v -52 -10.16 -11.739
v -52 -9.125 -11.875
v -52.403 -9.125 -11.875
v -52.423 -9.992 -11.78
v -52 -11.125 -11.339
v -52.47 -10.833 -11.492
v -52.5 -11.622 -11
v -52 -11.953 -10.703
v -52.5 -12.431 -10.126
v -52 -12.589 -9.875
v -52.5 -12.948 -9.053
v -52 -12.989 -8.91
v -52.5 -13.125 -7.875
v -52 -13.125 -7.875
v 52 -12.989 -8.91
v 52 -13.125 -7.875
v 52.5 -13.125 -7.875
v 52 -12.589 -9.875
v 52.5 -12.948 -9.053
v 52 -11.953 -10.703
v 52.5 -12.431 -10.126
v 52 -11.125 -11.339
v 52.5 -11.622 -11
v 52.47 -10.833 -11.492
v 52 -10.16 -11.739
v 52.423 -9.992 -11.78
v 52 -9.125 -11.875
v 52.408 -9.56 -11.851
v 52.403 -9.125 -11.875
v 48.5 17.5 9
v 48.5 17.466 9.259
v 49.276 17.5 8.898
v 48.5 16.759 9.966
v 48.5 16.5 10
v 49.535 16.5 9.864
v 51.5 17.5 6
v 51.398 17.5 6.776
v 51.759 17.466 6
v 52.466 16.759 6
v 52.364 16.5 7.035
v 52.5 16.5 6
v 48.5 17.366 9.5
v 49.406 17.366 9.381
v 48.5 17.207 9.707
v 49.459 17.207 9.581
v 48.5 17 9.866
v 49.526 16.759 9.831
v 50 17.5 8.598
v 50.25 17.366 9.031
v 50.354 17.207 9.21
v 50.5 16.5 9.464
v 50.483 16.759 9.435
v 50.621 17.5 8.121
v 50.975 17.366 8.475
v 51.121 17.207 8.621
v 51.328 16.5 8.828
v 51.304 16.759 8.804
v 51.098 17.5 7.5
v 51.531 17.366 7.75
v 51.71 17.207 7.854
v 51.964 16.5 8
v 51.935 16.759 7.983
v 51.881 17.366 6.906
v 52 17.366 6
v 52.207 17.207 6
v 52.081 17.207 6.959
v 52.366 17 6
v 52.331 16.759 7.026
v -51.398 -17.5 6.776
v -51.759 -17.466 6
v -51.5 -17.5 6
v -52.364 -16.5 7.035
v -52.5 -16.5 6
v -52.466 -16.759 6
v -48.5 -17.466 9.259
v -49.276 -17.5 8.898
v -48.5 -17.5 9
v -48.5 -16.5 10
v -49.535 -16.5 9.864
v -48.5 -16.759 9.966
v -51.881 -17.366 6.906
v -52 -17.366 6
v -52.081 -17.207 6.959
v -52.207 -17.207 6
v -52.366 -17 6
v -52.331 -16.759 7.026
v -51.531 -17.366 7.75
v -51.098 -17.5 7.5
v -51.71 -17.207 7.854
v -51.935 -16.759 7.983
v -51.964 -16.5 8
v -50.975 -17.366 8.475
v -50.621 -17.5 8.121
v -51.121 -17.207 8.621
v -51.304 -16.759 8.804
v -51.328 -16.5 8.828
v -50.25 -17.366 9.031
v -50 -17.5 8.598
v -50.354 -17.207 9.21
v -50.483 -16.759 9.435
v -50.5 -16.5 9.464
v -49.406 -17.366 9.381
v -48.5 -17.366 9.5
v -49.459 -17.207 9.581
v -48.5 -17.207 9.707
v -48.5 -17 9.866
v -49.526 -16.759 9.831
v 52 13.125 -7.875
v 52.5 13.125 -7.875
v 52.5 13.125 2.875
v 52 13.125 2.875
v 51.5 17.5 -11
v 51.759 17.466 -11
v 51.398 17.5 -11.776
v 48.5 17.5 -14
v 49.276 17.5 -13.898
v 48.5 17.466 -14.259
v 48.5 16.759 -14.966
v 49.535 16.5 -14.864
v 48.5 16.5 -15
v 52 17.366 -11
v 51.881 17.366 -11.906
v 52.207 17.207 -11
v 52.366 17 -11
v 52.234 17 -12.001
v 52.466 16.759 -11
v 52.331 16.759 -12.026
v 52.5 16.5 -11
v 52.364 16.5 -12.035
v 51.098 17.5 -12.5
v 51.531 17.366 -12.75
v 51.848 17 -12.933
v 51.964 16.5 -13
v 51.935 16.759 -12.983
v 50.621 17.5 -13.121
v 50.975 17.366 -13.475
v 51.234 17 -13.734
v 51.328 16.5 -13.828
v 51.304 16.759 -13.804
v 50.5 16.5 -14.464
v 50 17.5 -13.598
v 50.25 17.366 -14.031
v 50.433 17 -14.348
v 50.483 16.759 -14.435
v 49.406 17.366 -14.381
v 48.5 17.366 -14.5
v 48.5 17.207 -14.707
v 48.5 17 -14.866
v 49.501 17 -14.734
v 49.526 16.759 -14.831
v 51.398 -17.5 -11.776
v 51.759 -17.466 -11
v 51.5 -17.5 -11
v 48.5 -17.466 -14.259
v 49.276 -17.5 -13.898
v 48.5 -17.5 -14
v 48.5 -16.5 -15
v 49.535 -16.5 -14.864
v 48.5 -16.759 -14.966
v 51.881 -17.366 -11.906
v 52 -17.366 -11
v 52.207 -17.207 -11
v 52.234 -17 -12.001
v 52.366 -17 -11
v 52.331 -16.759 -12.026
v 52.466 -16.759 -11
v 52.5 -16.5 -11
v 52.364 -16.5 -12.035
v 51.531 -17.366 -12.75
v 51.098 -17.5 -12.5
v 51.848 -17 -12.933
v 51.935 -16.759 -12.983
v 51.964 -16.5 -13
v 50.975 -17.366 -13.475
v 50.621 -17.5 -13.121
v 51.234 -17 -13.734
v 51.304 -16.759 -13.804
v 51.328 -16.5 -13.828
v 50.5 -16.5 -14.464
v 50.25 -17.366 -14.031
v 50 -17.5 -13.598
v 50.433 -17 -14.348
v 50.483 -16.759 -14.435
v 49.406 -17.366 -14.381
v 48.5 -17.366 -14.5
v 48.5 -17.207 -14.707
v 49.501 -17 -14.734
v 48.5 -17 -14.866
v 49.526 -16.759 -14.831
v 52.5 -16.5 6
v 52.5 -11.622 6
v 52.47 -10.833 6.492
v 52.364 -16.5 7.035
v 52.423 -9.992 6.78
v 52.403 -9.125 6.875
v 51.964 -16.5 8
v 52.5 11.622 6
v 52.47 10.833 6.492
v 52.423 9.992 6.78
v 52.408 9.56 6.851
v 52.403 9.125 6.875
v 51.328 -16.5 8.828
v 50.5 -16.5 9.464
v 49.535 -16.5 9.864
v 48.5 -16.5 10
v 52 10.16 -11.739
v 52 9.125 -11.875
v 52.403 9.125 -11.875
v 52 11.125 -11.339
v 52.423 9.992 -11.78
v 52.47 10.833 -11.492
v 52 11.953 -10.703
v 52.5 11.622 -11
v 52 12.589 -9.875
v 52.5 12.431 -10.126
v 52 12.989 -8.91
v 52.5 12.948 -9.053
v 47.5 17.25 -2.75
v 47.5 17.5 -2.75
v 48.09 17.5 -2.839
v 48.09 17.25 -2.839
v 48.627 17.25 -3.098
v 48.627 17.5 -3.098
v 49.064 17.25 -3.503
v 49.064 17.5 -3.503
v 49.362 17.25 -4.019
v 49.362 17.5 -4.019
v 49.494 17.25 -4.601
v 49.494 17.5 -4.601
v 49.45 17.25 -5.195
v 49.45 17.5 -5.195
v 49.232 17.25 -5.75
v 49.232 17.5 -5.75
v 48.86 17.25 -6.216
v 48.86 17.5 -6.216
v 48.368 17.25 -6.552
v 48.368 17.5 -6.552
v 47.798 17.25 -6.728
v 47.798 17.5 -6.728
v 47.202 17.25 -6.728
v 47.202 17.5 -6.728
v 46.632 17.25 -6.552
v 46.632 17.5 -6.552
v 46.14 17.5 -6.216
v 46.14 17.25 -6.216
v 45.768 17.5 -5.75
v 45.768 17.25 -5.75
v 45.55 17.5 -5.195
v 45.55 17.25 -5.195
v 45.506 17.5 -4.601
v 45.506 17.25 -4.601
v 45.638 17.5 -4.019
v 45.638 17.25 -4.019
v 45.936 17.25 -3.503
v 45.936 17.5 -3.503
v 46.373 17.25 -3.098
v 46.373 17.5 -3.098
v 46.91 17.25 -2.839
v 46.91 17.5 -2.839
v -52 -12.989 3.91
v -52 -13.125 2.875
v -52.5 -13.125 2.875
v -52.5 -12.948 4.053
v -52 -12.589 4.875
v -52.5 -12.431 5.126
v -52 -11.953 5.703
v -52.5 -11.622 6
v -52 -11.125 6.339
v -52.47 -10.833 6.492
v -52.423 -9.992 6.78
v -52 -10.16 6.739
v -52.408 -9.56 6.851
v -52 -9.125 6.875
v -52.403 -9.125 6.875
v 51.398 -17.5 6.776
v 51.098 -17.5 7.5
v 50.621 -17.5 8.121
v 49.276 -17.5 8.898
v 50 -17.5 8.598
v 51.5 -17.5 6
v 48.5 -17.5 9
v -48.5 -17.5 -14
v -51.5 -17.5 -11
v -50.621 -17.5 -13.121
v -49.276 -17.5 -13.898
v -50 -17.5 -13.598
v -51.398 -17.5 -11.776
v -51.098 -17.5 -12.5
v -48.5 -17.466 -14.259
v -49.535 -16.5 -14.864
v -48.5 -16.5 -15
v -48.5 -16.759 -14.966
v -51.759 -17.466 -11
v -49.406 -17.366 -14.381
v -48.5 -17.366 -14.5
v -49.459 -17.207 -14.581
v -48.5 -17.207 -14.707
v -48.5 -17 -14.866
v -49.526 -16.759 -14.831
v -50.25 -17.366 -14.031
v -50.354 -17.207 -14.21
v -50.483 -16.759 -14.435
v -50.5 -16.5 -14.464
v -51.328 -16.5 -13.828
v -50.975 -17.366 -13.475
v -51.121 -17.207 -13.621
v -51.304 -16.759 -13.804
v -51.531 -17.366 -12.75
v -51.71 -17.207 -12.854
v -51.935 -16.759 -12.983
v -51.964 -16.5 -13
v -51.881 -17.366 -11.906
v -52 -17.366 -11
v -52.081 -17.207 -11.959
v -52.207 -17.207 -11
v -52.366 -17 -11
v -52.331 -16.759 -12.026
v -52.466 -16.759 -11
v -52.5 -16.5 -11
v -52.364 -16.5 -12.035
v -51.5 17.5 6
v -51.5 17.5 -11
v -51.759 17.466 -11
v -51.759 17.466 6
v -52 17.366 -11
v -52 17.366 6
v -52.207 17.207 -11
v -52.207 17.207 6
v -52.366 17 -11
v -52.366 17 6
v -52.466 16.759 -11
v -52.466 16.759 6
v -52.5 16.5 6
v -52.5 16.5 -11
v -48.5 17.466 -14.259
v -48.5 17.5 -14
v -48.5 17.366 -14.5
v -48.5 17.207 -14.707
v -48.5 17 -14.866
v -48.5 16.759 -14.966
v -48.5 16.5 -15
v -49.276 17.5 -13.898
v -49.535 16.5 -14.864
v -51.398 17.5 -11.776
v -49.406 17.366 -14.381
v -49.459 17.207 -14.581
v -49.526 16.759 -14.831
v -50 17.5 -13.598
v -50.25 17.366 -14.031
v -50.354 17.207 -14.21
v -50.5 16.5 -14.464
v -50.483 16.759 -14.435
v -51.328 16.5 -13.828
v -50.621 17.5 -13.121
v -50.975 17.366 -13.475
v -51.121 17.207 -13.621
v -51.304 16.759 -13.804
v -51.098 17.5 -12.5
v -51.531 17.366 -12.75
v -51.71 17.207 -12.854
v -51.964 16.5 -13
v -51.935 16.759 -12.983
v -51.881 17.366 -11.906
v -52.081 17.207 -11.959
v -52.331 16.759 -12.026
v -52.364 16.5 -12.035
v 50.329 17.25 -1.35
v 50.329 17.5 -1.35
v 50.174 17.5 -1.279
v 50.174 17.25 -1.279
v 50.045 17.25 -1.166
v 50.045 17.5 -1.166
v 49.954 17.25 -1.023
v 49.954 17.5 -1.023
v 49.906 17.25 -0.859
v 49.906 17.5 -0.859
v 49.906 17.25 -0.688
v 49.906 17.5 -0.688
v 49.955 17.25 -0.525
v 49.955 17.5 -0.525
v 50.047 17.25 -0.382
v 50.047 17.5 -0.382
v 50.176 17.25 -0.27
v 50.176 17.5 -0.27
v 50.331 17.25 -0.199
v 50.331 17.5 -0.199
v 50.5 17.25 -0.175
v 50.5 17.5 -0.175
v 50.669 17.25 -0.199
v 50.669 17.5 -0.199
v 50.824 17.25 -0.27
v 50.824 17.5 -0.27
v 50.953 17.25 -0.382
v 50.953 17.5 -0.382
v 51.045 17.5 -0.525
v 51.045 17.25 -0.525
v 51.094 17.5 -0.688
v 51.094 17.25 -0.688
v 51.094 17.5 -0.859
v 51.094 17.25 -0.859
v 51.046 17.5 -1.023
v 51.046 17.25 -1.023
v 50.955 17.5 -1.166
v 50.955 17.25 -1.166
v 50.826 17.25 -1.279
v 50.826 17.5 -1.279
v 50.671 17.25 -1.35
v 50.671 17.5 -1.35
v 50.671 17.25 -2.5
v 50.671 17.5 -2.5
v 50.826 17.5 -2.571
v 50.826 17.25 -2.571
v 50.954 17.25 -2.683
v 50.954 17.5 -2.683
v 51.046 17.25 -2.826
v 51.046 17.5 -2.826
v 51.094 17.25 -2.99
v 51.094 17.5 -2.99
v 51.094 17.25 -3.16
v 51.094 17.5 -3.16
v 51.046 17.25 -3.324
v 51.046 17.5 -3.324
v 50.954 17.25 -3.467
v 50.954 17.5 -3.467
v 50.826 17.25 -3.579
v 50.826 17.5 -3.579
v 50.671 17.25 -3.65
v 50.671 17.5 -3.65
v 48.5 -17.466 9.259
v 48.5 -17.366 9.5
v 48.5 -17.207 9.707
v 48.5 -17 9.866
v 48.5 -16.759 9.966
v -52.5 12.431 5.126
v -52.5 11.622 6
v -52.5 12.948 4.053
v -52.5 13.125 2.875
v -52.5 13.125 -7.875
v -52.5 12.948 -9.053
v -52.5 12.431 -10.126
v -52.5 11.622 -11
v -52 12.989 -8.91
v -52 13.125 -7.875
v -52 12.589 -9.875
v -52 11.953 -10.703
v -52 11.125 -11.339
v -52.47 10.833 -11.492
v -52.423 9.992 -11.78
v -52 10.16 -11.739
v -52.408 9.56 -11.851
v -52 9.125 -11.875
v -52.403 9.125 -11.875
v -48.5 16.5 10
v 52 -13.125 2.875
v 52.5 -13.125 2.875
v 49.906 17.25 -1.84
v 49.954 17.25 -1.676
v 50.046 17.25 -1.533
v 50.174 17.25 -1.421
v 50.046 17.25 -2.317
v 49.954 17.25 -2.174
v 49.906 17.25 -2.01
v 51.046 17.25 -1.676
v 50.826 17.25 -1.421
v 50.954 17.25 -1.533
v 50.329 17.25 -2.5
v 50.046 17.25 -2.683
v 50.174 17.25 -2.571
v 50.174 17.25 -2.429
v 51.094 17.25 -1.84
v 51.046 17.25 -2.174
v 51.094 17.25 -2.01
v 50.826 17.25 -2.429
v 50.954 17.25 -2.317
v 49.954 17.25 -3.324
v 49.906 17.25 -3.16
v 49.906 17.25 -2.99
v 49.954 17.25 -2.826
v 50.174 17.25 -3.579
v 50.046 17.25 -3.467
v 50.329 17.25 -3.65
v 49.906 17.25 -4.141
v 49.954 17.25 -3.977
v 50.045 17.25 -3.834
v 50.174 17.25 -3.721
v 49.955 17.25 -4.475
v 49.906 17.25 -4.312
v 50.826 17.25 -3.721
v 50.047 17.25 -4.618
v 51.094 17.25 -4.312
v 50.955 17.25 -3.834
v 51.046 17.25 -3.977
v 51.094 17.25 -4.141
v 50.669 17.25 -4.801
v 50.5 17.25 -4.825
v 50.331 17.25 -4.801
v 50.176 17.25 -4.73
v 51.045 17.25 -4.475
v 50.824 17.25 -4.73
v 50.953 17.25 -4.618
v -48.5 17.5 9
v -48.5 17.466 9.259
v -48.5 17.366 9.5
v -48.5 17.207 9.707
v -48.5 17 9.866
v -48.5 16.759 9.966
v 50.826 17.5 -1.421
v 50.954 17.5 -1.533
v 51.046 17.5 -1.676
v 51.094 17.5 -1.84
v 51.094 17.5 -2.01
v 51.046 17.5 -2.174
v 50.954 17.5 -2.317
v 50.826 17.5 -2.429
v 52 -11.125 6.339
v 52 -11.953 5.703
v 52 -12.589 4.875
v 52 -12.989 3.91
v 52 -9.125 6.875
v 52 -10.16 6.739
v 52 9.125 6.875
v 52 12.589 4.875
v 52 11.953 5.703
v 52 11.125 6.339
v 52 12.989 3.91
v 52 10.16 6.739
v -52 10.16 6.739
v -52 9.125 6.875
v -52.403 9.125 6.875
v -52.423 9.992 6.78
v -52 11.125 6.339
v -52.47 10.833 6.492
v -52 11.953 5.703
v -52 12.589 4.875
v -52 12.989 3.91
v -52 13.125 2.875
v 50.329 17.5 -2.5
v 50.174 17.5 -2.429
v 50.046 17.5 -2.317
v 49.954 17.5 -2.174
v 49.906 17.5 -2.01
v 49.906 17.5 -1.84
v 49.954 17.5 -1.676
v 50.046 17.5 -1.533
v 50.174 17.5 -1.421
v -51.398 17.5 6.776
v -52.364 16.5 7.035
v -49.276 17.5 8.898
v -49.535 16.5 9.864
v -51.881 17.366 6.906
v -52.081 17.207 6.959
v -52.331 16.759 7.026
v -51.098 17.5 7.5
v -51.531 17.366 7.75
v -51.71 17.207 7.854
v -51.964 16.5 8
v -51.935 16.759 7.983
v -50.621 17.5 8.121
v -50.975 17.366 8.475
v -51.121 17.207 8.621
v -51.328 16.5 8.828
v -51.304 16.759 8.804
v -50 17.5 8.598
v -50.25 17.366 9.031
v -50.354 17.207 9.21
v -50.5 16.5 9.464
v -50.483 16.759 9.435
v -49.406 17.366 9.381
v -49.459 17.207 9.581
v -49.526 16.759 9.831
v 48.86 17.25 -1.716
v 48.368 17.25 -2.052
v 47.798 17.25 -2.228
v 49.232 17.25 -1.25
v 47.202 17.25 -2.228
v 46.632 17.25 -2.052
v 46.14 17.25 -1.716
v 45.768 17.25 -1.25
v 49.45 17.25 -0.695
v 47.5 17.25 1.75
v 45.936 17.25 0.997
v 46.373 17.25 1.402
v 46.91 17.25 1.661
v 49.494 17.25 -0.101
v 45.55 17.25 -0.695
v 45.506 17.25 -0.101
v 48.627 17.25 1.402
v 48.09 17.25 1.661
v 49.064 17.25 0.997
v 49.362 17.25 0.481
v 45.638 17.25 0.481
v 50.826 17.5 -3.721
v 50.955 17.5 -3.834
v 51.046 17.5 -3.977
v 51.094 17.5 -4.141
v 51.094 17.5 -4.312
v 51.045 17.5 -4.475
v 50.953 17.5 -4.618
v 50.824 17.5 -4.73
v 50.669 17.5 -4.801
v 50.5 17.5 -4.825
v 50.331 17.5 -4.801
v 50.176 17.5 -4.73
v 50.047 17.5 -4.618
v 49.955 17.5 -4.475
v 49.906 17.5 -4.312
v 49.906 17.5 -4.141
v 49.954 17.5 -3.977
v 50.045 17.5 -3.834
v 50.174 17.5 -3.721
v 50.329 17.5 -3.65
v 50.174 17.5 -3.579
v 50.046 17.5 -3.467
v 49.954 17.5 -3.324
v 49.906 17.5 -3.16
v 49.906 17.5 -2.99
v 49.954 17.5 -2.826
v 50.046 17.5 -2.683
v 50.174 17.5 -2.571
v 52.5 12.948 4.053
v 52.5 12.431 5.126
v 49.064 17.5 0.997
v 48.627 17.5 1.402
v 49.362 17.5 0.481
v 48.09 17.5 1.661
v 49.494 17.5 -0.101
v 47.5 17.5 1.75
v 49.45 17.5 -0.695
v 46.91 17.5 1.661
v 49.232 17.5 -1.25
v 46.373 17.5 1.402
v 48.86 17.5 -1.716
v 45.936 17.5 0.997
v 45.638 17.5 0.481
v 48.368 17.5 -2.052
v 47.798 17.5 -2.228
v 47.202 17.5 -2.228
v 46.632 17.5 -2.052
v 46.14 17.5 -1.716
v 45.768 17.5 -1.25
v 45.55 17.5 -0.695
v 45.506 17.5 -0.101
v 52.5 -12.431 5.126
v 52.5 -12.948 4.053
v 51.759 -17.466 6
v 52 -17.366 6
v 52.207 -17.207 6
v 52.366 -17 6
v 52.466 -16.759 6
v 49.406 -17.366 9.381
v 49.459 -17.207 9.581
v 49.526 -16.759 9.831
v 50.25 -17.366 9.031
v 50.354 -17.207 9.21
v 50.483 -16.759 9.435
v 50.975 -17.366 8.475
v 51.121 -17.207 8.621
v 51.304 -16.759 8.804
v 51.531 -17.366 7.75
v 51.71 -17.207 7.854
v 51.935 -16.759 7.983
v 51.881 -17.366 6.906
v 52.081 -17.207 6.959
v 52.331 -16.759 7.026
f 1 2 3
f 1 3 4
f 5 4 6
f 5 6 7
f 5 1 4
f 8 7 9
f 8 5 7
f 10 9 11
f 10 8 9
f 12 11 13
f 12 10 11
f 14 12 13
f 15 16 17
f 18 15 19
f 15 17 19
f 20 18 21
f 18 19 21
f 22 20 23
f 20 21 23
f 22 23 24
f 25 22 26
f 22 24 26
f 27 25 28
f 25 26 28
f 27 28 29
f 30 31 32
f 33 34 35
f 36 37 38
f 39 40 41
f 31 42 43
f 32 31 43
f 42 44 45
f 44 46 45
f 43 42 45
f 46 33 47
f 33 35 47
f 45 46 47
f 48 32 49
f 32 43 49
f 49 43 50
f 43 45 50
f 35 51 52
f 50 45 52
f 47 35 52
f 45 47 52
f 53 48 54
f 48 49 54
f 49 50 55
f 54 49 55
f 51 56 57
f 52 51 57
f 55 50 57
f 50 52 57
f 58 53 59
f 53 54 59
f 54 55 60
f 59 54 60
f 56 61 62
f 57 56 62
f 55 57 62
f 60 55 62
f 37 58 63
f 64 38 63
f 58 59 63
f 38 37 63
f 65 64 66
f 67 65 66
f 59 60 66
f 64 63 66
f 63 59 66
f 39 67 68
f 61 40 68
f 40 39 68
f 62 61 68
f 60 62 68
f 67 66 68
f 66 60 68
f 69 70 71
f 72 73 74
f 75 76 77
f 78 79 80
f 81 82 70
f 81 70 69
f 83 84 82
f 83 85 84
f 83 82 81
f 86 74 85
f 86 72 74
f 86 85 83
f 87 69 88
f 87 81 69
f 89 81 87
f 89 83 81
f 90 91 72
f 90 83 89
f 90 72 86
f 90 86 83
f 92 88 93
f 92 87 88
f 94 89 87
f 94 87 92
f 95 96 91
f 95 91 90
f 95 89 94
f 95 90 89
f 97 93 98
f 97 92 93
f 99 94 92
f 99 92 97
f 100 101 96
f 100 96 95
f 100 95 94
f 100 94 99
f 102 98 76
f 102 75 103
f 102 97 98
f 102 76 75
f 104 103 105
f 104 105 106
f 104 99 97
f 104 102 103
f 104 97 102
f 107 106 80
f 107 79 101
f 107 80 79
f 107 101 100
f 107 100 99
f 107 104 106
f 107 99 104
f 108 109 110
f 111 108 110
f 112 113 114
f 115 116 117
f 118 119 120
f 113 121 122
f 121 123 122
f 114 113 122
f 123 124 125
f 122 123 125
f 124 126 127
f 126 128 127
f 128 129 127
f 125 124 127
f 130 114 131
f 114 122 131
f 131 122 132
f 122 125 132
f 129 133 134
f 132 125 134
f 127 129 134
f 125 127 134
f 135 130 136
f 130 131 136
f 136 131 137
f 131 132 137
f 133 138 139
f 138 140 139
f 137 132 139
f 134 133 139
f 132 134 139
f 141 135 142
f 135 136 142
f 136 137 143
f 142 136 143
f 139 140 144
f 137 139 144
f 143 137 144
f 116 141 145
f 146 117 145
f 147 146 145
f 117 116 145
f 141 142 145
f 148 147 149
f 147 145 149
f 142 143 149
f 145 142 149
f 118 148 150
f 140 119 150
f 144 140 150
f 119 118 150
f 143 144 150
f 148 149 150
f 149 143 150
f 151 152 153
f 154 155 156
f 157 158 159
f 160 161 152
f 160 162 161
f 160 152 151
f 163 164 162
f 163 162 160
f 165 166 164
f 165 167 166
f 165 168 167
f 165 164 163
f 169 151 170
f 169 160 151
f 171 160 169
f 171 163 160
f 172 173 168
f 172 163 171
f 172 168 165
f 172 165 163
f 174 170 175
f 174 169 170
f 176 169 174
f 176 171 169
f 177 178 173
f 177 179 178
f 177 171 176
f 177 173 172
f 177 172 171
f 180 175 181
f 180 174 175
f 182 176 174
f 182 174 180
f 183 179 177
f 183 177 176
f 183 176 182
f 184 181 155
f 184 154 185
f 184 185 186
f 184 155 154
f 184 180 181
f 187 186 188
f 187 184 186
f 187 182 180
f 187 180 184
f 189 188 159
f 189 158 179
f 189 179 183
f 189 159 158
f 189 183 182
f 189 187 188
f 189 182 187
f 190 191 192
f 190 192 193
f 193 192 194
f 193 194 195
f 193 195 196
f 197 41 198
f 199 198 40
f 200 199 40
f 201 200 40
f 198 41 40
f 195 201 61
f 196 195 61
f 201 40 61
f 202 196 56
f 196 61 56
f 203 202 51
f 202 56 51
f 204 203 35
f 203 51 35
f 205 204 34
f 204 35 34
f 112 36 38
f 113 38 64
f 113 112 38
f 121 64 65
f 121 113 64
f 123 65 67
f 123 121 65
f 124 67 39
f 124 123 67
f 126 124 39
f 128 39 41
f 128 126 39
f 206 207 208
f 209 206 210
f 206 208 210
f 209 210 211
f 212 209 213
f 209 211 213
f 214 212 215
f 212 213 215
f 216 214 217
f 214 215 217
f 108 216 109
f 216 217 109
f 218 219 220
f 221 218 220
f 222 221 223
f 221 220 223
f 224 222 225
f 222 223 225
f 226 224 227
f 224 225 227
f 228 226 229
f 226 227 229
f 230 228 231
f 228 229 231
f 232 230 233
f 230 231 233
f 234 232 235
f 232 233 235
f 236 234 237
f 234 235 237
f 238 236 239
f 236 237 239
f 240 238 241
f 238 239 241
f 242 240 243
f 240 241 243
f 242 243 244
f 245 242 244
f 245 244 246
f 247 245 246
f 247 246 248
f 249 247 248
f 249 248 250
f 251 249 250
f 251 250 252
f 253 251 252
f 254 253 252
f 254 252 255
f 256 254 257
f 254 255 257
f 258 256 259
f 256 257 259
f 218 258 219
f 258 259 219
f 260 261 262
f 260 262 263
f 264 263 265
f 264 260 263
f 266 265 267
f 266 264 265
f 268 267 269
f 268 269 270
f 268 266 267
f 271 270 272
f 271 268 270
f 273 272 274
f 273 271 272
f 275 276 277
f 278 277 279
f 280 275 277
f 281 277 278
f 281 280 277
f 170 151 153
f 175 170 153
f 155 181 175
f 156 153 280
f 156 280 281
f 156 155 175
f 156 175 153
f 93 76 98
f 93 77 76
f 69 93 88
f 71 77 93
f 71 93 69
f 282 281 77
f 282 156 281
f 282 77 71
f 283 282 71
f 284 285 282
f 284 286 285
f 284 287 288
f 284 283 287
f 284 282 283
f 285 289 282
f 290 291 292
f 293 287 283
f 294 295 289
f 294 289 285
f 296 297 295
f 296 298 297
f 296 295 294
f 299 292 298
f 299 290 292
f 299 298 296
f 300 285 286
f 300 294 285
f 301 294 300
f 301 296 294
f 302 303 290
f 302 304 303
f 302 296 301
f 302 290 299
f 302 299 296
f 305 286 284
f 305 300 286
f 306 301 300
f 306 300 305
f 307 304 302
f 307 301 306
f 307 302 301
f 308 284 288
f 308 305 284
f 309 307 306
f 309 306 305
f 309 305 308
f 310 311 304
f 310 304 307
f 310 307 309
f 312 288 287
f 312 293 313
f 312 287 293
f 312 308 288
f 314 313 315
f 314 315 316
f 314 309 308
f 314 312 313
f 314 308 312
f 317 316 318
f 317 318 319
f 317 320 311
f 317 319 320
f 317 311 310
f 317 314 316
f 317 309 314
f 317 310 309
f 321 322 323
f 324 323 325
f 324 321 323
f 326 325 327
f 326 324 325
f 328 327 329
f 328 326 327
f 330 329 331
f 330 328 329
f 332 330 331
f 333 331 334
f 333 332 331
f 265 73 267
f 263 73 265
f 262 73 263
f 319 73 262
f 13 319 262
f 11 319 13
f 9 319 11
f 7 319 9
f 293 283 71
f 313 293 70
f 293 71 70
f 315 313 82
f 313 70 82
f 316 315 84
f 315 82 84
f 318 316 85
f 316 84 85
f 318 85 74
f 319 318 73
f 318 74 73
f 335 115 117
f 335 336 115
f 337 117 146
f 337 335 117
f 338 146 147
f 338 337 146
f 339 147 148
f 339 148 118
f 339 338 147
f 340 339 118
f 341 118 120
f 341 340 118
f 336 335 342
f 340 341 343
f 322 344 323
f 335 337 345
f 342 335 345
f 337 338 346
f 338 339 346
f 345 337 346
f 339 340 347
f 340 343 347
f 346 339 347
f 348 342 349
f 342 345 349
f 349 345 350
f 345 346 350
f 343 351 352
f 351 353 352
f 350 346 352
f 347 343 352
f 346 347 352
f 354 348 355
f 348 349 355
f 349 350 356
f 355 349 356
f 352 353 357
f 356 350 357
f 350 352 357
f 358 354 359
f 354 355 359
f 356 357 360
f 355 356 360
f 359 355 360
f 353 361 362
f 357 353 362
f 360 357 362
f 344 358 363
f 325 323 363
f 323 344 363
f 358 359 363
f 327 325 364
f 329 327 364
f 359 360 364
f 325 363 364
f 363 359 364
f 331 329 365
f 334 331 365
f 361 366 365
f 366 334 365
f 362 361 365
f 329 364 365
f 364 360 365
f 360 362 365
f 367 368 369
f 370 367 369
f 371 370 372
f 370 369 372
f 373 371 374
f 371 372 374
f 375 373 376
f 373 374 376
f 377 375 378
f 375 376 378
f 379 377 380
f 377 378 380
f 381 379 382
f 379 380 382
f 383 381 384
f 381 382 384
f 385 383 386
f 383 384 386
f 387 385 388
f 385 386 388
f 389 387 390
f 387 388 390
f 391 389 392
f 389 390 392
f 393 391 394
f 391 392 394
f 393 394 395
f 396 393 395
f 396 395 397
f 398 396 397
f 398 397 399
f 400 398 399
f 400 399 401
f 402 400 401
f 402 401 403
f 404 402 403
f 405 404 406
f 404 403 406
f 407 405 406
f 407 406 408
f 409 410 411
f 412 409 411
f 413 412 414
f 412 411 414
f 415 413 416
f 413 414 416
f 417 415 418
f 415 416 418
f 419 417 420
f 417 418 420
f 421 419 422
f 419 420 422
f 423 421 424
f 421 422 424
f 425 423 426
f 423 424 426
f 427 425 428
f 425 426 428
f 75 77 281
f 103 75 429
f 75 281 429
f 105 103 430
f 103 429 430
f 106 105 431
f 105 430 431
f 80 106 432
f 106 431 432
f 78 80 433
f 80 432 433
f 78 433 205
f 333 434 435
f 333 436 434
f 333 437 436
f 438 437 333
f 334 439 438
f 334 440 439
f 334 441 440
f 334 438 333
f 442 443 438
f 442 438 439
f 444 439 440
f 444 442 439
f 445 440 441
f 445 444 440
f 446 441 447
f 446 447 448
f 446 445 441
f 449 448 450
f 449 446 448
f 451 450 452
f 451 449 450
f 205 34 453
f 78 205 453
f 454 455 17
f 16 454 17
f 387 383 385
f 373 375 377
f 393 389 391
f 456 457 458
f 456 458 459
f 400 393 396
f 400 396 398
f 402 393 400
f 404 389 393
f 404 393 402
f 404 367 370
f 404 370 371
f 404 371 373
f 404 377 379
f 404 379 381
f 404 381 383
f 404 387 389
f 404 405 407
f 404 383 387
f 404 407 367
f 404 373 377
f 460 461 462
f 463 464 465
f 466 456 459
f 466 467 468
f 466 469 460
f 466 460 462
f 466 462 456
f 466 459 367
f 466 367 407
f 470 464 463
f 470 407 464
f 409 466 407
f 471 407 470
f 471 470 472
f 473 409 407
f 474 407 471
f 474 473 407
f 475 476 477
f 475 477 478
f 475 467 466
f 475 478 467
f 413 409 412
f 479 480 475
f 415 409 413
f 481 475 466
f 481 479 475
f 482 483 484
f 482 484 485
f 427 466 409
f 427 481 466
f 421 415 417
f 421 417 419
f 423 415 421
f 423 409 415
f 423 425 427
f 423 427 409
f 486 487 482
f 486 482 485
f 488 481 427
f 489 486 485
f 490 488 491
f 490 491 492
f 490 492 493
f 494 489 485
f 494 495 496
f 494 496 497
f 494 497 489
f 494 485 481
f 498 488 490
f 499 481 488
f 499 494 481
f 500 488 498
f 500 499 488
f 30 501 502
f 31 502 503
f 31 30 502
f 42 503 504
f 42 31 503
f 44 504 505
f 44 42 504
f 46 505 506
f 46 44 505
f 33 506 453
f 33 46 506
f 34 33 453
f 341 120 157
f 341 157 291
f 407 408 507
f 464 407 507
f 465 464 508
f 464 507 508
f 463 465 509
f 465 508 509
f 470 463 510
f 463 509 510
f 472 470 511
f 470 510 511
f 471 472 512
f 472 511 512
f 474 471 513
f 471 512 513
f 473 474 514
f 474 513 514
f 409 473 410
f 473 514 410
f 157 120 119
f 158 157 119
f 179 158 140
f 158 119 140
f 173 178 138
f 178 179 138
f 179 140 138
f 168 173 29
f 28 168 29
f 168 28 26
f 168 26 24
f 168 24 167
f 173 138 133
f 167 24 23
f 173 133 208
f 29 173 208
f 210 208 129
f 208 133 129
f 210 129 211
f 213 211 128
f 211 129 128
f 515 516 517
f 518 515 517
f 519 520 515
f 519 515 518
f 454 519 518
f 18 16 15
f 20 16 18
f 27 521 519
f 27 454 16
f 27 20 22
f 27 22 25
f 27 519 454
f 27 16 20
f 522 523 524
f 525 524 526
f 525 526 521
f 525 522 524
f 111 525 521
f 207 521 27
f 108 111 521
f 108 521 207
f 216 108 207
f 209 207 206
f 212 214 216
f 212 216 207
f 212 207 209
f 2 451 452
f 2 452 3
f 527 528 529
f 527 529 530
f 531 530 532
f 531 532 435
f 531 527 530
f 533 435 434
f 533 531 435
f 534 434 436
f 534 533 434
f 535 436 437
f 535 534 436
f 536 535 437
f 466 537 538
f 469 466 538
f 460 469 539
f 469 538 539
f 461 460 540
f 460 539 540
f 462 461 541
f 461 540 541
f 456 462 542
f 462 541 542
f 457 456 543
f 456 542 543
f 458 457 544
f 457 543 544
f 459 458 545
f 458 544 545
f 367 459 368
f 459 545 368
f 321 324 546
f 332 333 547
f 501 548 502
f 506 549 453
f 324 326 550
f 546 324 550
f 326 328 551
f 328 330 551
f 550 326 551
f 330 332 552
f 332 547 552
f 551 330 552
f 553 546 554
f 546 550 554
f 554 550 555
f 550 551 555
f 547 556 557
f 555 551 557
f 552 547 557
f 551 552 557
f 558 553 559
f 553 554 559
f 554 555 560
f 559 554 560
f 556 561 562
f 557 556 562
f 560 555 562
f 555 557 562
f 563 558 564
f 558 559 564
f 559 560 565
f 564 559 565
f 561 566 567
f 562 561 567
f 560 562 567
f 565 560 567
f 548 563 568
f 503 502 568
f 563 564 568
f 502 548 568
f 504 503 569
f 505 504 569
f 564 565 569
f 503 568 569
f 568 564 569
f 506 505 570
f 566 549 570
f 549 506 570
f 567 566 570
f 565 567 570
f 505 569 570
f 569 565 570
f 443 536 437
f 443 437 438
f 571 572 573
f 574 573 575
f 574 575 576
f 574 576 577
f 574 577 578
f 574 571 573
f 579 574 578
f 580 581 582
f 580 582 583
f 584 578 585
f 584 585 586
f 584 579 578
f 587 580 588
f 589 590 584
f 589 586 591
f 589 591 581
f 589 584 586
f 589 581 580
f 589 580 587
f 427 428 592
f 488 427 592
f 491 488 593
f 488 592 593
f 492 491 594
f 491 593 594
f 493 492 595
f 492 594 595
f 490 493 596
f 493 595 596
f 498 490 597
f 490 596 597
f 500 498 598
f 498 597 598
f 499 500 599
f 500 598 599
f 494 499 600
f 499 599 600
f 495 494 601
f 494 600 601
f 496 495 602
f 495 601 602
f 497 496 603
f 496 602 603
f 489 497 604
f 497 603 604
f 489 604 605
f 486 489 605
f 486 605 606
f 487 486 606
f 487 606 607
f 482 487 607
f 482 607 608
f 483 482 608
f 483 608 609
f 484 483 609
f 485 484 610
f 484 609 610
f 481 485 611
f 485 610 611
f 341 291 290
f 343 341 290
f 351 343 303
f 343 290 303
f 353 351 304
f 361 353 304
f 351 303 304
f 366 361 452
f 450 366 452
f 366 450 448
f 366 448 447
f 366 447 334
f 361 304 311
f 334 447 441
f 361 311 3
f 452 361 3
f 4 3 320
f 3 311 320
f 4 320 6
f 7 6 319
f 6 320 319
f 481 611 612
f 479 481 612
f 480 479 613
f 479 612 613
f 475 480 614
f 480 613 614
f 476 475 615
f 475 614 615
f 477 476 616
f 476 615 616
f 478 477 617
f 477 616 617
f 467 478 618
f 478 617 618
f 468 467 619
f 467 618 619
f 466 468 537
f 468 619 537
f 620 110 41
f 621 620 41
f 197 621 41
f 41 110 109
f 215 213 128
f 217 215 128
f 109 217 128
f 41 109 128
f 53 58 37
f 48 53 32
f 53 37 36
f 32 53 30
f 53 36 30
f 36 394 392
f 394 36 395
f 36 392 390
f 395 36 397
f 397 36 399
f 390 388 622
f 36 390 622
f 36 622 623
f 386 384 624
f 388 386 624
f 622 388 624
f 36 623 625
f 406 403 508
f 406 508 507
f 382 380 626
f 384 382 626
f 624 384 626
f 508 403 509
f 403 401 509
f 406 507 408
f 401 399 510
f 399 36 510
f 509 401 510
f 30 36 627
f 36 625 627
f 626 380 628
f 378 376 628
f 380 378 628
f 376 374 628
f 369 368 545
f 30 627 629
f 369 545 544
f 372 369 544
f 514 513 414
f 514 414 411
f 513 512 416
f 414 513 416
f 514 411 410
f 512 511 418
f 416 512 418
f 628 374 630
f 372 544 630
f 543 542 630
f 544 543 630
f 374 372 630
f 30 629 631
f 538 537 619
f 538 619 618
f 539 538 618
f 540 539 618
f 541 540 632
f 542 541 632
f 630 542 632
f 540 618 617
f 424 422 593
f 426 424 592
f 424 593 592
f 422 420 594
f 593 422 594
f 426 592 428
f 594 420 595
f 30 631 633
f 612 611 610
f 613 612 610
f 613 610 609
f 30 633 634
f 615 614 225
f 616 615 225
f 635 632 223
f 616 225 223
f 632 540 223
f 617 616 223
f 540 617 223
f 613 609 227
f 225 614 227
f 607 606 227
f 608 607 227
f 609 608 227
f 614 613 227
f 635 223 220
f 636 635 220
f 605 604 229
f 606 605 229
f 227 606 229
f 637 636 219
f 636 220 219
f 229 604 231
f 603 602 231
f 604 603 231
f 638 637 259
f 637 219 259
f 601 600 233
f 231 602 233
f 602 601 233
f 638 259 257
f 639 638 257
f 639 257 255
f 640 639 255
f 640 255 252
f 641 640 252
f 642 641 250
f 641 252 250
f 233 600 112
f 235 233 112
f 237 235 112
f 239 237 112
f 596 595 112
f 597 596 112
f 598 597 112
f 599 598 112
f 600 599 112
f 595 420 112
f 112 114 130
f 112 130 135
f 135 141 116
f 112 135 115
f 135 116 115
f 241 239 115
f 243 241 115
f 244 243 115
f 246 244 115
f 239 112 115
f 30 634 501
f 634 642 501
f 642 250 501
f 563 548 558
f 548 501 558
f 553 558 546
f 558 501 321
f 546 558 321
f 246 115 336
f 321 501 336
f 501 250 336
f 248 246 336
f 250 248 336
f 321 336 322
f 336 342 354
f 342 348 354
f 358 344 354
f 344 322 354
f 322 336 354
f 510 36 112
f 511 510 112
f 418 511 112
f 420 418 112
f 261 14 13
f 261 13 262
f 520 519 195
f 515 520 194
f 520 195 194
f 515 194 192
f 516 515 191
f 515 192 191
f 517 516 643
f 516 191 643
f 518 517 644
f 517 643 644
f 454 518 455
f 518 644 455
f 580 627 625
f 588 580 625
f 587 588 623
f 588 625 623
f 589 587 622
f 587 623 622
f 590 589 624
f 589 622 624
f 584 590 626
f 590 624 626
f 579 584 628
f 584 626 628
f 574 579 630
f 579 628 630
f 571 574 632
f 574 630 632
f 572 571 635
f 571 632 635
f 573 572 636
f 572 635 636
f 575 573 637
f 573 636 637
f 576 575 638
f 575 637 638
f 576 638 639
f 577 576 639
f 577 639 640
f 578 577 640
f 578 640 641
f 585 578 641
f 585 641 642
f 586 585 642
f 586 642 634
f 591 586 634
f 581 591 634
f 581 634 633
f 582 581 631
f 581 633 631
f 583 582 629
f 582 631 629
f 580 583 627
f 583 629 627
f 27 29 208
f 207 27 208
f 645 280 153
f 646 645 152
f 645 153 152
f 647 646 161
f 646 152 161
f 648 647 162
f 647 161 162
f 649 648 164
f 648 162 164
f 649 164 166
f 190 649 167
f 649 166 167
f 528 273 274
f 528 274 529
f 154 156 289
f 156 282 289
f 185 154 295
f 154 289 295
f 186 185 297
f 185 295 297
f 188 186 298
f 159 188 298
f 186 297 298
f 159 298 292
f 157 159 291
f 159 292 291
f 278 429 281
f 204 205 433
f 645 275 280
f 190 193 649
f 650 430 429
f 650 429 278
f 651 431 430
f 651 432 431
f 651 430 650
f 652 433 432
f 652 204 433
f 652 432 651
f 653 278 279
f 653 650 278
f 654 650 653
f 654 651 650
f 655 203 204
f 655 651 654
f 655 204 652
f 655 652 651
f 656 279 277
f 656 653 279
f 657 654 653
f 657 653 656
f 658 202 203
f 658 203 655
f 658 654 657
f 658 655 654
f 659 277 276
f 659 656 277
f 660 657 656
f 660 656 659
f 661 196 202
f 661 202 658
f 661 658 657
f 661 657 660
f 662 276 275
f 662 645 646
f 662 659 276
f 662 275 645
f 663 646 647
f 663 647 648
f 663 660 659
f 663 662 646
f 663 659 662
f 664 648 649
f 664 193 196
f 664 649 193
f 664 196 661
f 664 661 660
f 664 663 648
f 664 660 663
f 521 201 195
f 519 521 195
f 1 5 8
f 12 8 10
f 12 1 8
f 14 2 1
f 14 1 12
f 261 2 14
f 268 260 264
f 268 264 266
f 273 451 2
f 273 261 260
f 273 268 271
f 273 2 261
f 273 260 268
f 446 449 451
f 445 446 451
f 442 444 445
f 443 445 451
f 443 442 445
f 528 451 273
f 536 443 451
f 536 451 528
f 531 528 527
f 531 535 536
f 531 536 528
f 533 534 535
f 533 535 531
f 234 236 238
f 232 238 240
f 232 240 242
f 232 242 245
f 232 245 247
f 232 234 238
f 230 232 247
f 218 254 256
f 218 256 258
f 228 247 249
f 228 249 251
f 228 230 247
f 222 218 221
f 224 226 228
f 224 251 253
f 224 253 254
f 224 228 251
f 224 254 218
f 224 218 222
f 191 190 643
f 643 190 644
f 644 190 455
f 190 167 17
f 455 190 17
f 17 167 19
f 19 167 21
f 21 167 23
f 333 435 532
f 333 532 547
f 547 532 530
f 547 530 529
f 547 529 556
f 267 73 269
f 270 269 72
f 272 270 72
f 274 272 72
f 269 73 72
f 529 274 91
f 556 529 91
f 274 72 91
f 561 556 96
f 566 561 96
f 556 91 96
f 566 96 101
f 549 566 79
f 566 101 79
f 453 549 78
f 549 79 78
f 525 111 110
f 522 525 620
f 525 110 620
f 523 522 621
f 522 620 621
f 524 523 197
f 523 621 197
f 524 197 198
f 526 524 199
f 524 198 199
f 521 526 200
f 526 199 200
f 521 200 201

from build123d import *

# Parameters (mm, degrees)
SKETCH1_W           = 105
SKETCH1_H           = 35
BOSS_EXTRUDE1_DEPTH = 25
CUT_EXTRUDE1_DEPTH  = 0.5
CUT_EXTRUDE2_START  = -0.5
CUT_EXTRUDE2_DEPTH  = 0.5
FILLET1_R           = 4
FILLET2_R           = 1
SKETCH5_R           = 2
CUT_EXTRUDE3_DEPTH  = 0.25
CUT_EXTRUDE4_DEPTH  = 0.25


with BuildPart() as part:
    # Sketch1 → Boss-Extrude1 (new body)
    with BuildSketch(Plane(origin=(0, 0, -15), x_dir=(-1, 0, 0), z_dir=(0, 0, -1))):
        Rectangle(SKETCH1_W, SKETCH1_H)
    extrude(amount=-BOSS_EXTRUDE1_DEPTH)

    # Sketch2 → Cut-Extrude1 (cut)
    with BuildSketch(Plane(origin=(52.5, 0, 0), x_dir=(0, 0, -1), z_dir=(1, 0, 0))):
        with BuildLine():
            Line((-6.875, 9.125), (-6.875, -9.125))
            ThreePointArc((-6.875, -9.125), (-5.703427125, -11.953427125), (-2.875, -13.125))
            Line((-2.875, -13.125), (7.875, -13.125))
            ThreePointArc((7.875, -13.125), (10.703427125, -11.953427125), (11.875, -9.125))
            Line((11.875, -9.125), (11.875, 9.125))
            ThreePointArc((11.875, 9.125), (10.703427125, 11.953427125), (7.875, 13.125))
            Line((7.875, 13.125), (-2.875, 13.125))
            ThreePointArc((-2.875, 13.125), (-5.703427125, 11.953427125), (-6.875, 9.125))
        make_face()
    extrude(amount=-CUT_EXTRUDE1_DEPTH, mode=Mode.SUBTRACT)

    # Sketch3 → Cut-Extrude2 (cut)
    with BuildSketch(Plane.ZY.offset(52.5).offset(CUT_EXTRUDE2_START)):
        with BuildLine():
            Line((2.875, 13.125), (-7.875, 13.125))
            ThreePointArc((-7.875, 13.125), (-10.703427125, 11.953427125), (-11.875, 9.125))
            Line((-11.875, 9.125), (-11.875, -9.125))
            ThreePointArc((-11.875, -9.125), (-10.703427125, -11.953427125), (-7.875, -13.125))
            Line((-7.875, -13.125), (2.875, -13.125))
            ThreePointArc((2.875, -13.125), (5.703427125, -11.953427125), (6.875, -9.125))
            Line((6.875, -9.125), (6.875, 9.125))
            ThreePointArc((6.875, 9.125), (5.703427125, 11.953427125), (2.875, 13.125))
        make_face()
    extrude(amount=CUT_EXTRUDE2_DEPTH, mode=Mode.SUBTRACT)

    # Fillet1
    # the kernel refuses this fillet: 4 mm, written as the material it takes off along each edge
    with BuildSketch(Plane(origin=(-52.5, -27.5, -15), x_dir=(0, 0, 1), z_dir=(0, 1, 0)), Plane(origin=(52.5, 27.5, -15), x_dir=(0, 0, 1), z_dir=(0, -1, 0))) as fillet1_piece_1:
        with BuildLine():
            CenterArc((FILLET1_R, FILLET1_R), FILLET1_R, 180, 90)
            Line((0, FILLET1_R), (0, 0))
            Line((0, 0), (FILLET1_R, 0))
        make_face()
    extrude(amount=55, mode=Mode.SUBTRACT)
    with BuildSketch(Plane(origin=(-52.5, -27.5, 10), x_dir=(0, 0, -1), z_dir=(0, 1, 0)), Plane(origin=(52.5, 27.5, 10), x_dir=(0, 0, -1), z_dir=(0, -1, 0))) as fillet1_piece_2:
        with BuildLine():
            CenterArc((FILLET1_R, -FILLET1_R), FILLET1_R, 90, 90)
            Line((0, -FILLET1_R), (0, 0))
            Line((0, 0), (FILLET1_R, 0))
        make_face()
    extrude(amount=55, mode=Mode.SUBTRACT)

    # Fillet2
    fillet2_edges = [part.edges().sort_by_distance(p)[0] for p in [
        (0, -17.5, -15),
        (0, 17.5, -15),
        (-52.5, 17.5, -2.5),
        (0, 17.5, 10),
        (52.5, 17.5, -2.5),
        (51.328427125, 17.5, 8.828427125),
        (51.328427125, 17.5, -13.828427125),
        (-51.328427125, 17.5, 8.828427125),
        (-51.328427125, 17.5, -13.828427125),
        (-52.5, -17.5, -2.5),
        (52.5, -17.5, -2.5),
        (0, -17.5, 10),
        (51.328427125, -17.5, 8.828427125),
        (51.328427125, -17.5, -13.828427125),
        (-51.328427125, -17.5, 8.828427125),
        (-51.328427125, -17.5, -13.828427125),
    ]]
    fillet(fillet2_edges, radius=FILLET2_R)

    # Sketch5 → Cut-Extrude3 (cut)
    with BuildSketch(Plane(origin=(0, 17.5, 0), x_dir=(1, 0, 0), z_dir=(0, 1, 0))):
        with Locations(Location((47.5, 0.25, 0), (0, 0, 270))):
            Circle(SKETCH5_R)
        with Locations(Location((47.5, 4.75, 0), (0, 0, 270))):
            Circle(SKETCH5_R)
    extrude(amount=-CUT_EXTRUDE3_DEPTH, mode=Mode.SUBTRACT)

    # Sketch6 → Cut-Extrude4 (cut)
    with BuildSketch(Plane(origin=(0, 17.5, 0), x_dir=(1, 0, 0), z_dir=(0, 1, 0))):
        with BuildLine():
            ThreePointArc((50.671391365, 3.65), (50.5, 4.825), (50.328608635, 3.65))
            ThreePointArc((50.328608635, 3.65), (49.9, 3.075), (50.328608635, 2.5))
            ThreePointArc((50.328608635, 2.5), (49.9, 1.925), (50.328608635, 1.35))
            ThreePointArc((50.328608635, 1.35), (50.5, 0.175), (50.671391365, 1.35))
            ThreePointArc((50.671391365, 1.35), (51.1, 1.925), (50.671391365, 2.5))
            ThreePointArc((50.671391365, 2.5), (51.1, 3.075), (50.671391365, 3.65))
        make_face()
    extrude(amount=-CUT_EXTRUDE4_DEPTH, mode=Mode.SUBTRACT)


solid = part.part
